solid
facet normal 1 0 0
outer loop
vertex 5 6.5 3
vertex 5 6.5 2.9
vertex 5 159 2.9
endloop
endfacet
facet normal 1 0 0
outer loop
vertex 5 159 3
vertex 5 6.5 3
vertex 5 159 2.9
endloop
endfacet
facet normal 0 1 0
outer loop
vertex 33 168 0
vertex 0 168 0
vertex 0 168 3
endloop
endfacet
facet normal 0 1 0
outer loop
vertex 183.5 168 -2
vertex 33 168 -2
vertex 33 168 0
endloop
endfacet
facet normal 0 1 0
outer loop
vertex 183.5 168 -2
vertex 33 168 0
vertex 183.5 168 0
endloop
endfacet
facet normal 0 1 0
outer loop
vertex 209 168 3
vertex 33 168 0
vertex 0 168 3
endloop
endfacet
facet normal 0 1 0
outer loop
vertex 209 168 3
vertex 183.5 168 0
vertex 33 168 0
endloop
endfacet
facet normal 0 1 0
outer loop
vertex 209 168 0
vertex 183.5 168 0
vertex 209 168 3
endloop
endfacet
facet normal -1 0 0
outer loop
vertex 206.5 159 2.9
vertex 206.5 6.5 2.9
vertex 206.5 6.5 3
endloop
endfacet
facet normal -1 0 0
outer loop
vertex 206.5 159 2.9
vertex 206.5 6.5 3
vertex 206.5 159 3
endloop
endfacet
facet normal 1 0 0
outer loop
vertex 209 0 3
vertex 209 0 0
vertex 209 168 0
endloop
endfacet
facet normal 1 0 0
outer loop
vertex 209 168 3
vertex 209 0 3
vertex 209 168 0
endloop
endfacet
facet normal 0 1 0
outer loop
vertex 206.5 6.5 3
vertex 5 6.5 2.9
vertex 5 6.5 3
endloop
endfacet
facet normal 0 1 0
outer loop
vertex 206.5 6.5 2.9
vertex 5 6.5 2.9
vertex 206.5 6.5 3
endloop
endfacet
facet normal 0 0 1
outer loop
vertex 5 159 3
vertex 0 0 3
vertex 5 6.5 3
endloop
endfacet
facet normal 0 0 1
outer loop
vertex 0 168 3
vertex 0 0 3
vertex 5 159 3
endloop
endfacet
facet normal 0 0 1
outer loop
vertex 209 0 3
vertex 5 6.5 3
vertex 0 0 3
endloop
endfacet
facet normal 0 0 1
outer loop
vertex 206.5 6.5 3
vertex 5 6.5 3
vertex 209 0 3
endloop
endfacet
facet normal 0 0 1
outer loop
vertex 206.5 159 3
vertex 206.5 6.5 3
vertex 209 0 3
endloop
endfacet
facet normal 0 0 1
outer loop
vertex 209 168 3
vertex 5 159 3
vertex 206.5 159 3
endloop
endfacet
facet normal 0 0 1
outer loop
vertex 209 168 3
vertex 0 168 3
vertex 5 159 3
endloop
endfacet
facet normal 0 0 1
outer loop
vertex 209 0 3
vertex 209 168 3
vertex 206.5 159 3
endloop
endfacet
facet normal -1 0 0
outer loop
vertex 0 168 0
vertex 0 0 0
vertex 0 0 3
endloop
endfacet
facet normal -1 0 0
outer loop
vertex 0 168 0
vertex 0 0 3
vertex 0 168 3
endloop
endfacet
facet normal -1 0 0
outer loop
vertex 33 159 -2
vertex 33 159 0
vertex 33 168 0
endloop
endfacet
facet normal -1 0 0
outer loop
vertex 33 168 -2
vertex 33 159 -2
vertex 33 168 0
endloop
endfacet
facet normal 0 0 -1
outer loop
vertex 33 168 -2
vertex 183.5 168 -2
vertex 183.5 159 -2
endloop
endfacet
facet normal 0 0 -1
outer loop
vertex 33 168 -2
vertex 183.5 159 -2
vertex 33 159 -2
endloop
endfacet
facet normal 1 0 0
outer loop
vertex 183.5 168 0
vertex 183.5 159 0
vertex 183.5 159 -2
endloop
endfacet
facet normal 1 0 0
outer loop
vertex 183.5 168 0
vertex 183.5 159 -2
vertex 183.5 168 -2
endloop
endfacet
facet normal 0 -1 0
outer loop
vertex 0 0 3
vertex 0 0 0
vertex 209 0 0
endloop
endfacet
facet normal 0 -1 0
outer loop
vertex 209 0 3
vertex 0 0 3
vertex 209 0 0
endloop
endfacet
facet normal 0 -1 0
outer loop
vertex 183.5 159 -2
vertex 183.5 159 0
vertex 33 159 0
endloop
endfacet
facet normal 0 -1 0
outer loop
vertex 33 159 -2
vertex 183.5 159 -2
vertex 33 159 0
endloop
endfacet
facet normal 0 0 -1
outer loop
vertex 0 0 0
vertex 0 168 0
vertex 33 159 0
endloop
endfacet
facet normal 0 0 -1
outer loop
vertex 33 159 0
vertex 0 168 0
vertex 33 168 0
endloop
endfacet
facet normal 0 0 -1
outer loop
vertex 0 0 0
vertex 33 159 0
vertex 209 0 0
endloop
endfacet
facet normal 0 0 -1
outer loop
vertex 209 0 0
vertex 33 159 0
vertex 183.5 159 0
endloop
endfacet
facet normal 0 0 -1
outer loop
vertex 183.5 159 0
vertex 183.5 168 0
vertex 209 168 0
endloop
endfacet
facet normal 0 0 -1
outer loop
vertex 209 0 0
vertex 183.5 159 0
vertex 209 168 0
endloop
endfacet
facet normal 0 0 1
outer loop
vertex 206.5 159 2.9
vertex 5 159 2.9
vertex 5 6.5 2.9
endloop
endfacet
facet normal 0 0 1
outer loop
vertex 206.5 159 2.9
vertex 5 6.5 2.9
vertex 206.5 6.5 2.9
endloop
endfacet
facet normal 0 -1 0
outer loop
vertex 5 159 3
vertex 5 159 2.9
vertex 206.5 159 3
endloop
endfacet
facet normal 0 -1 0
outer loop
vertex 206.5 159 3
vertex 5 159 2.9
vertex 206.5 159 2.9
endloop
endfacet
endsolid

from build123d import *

# Parameters (mm, degrees)
SKETCH_1_W        = 209
SKETCH_1_H        = 168
SKETCH_1_W_2      = 201.5
SKETCH_1_H_2      = 152.5
EXTRUDE_1_1_DEPTH = 3
SKETCH_1_3_W      = 201.5
SKETCH_1_3_H      = 152.5
EXTRUDE_1_2_DEPTH = 2.9
SKETCH_3_W        = 150.5
SKETCH_3_H        = 9
EXTRUDE_2_1_DEPTH = 2


with BuildPart() as part:
    # 草图1 → 1-1 (new body)
    with BuildSketch(Plane.XY):
        with Locations((104.5, 84)):
            Rectangle(SKETCH_1_W, SKETCH_1_H)
        with Locations((105.75, 82.75)):
            Rectangle(SKETCH_1_W_2, SKETCH_1_H_2, mode=Mode.SUBTRACT)
    extrude(amount=EXTRUDE_1_1_DEPTH)

    # 草图1<3> → 1-2 (add)
    with BuildSketch(Plane.XY):
        with Locations((105.75, 82.75)):
            Rectangle(SKETCH_1_3_W, SKETCH_1_3_H)
    extrude(amount=EXTRUDE_1_2_DEPTH)

    # 草图3 → 2-1 (add)
    with BuildSketch(Plane(origin=(0, 0, 0), x_dir=(-1, 0, 0), z_dir=(0, 0, -1))):
        with Locations((-108.25, 163.5)):
            Rectangle(SKETCH_3_W, SKETCH_3_H)
    extrude(amount=EXTRUDE_2_1_DEPTH)


solid = part.part
